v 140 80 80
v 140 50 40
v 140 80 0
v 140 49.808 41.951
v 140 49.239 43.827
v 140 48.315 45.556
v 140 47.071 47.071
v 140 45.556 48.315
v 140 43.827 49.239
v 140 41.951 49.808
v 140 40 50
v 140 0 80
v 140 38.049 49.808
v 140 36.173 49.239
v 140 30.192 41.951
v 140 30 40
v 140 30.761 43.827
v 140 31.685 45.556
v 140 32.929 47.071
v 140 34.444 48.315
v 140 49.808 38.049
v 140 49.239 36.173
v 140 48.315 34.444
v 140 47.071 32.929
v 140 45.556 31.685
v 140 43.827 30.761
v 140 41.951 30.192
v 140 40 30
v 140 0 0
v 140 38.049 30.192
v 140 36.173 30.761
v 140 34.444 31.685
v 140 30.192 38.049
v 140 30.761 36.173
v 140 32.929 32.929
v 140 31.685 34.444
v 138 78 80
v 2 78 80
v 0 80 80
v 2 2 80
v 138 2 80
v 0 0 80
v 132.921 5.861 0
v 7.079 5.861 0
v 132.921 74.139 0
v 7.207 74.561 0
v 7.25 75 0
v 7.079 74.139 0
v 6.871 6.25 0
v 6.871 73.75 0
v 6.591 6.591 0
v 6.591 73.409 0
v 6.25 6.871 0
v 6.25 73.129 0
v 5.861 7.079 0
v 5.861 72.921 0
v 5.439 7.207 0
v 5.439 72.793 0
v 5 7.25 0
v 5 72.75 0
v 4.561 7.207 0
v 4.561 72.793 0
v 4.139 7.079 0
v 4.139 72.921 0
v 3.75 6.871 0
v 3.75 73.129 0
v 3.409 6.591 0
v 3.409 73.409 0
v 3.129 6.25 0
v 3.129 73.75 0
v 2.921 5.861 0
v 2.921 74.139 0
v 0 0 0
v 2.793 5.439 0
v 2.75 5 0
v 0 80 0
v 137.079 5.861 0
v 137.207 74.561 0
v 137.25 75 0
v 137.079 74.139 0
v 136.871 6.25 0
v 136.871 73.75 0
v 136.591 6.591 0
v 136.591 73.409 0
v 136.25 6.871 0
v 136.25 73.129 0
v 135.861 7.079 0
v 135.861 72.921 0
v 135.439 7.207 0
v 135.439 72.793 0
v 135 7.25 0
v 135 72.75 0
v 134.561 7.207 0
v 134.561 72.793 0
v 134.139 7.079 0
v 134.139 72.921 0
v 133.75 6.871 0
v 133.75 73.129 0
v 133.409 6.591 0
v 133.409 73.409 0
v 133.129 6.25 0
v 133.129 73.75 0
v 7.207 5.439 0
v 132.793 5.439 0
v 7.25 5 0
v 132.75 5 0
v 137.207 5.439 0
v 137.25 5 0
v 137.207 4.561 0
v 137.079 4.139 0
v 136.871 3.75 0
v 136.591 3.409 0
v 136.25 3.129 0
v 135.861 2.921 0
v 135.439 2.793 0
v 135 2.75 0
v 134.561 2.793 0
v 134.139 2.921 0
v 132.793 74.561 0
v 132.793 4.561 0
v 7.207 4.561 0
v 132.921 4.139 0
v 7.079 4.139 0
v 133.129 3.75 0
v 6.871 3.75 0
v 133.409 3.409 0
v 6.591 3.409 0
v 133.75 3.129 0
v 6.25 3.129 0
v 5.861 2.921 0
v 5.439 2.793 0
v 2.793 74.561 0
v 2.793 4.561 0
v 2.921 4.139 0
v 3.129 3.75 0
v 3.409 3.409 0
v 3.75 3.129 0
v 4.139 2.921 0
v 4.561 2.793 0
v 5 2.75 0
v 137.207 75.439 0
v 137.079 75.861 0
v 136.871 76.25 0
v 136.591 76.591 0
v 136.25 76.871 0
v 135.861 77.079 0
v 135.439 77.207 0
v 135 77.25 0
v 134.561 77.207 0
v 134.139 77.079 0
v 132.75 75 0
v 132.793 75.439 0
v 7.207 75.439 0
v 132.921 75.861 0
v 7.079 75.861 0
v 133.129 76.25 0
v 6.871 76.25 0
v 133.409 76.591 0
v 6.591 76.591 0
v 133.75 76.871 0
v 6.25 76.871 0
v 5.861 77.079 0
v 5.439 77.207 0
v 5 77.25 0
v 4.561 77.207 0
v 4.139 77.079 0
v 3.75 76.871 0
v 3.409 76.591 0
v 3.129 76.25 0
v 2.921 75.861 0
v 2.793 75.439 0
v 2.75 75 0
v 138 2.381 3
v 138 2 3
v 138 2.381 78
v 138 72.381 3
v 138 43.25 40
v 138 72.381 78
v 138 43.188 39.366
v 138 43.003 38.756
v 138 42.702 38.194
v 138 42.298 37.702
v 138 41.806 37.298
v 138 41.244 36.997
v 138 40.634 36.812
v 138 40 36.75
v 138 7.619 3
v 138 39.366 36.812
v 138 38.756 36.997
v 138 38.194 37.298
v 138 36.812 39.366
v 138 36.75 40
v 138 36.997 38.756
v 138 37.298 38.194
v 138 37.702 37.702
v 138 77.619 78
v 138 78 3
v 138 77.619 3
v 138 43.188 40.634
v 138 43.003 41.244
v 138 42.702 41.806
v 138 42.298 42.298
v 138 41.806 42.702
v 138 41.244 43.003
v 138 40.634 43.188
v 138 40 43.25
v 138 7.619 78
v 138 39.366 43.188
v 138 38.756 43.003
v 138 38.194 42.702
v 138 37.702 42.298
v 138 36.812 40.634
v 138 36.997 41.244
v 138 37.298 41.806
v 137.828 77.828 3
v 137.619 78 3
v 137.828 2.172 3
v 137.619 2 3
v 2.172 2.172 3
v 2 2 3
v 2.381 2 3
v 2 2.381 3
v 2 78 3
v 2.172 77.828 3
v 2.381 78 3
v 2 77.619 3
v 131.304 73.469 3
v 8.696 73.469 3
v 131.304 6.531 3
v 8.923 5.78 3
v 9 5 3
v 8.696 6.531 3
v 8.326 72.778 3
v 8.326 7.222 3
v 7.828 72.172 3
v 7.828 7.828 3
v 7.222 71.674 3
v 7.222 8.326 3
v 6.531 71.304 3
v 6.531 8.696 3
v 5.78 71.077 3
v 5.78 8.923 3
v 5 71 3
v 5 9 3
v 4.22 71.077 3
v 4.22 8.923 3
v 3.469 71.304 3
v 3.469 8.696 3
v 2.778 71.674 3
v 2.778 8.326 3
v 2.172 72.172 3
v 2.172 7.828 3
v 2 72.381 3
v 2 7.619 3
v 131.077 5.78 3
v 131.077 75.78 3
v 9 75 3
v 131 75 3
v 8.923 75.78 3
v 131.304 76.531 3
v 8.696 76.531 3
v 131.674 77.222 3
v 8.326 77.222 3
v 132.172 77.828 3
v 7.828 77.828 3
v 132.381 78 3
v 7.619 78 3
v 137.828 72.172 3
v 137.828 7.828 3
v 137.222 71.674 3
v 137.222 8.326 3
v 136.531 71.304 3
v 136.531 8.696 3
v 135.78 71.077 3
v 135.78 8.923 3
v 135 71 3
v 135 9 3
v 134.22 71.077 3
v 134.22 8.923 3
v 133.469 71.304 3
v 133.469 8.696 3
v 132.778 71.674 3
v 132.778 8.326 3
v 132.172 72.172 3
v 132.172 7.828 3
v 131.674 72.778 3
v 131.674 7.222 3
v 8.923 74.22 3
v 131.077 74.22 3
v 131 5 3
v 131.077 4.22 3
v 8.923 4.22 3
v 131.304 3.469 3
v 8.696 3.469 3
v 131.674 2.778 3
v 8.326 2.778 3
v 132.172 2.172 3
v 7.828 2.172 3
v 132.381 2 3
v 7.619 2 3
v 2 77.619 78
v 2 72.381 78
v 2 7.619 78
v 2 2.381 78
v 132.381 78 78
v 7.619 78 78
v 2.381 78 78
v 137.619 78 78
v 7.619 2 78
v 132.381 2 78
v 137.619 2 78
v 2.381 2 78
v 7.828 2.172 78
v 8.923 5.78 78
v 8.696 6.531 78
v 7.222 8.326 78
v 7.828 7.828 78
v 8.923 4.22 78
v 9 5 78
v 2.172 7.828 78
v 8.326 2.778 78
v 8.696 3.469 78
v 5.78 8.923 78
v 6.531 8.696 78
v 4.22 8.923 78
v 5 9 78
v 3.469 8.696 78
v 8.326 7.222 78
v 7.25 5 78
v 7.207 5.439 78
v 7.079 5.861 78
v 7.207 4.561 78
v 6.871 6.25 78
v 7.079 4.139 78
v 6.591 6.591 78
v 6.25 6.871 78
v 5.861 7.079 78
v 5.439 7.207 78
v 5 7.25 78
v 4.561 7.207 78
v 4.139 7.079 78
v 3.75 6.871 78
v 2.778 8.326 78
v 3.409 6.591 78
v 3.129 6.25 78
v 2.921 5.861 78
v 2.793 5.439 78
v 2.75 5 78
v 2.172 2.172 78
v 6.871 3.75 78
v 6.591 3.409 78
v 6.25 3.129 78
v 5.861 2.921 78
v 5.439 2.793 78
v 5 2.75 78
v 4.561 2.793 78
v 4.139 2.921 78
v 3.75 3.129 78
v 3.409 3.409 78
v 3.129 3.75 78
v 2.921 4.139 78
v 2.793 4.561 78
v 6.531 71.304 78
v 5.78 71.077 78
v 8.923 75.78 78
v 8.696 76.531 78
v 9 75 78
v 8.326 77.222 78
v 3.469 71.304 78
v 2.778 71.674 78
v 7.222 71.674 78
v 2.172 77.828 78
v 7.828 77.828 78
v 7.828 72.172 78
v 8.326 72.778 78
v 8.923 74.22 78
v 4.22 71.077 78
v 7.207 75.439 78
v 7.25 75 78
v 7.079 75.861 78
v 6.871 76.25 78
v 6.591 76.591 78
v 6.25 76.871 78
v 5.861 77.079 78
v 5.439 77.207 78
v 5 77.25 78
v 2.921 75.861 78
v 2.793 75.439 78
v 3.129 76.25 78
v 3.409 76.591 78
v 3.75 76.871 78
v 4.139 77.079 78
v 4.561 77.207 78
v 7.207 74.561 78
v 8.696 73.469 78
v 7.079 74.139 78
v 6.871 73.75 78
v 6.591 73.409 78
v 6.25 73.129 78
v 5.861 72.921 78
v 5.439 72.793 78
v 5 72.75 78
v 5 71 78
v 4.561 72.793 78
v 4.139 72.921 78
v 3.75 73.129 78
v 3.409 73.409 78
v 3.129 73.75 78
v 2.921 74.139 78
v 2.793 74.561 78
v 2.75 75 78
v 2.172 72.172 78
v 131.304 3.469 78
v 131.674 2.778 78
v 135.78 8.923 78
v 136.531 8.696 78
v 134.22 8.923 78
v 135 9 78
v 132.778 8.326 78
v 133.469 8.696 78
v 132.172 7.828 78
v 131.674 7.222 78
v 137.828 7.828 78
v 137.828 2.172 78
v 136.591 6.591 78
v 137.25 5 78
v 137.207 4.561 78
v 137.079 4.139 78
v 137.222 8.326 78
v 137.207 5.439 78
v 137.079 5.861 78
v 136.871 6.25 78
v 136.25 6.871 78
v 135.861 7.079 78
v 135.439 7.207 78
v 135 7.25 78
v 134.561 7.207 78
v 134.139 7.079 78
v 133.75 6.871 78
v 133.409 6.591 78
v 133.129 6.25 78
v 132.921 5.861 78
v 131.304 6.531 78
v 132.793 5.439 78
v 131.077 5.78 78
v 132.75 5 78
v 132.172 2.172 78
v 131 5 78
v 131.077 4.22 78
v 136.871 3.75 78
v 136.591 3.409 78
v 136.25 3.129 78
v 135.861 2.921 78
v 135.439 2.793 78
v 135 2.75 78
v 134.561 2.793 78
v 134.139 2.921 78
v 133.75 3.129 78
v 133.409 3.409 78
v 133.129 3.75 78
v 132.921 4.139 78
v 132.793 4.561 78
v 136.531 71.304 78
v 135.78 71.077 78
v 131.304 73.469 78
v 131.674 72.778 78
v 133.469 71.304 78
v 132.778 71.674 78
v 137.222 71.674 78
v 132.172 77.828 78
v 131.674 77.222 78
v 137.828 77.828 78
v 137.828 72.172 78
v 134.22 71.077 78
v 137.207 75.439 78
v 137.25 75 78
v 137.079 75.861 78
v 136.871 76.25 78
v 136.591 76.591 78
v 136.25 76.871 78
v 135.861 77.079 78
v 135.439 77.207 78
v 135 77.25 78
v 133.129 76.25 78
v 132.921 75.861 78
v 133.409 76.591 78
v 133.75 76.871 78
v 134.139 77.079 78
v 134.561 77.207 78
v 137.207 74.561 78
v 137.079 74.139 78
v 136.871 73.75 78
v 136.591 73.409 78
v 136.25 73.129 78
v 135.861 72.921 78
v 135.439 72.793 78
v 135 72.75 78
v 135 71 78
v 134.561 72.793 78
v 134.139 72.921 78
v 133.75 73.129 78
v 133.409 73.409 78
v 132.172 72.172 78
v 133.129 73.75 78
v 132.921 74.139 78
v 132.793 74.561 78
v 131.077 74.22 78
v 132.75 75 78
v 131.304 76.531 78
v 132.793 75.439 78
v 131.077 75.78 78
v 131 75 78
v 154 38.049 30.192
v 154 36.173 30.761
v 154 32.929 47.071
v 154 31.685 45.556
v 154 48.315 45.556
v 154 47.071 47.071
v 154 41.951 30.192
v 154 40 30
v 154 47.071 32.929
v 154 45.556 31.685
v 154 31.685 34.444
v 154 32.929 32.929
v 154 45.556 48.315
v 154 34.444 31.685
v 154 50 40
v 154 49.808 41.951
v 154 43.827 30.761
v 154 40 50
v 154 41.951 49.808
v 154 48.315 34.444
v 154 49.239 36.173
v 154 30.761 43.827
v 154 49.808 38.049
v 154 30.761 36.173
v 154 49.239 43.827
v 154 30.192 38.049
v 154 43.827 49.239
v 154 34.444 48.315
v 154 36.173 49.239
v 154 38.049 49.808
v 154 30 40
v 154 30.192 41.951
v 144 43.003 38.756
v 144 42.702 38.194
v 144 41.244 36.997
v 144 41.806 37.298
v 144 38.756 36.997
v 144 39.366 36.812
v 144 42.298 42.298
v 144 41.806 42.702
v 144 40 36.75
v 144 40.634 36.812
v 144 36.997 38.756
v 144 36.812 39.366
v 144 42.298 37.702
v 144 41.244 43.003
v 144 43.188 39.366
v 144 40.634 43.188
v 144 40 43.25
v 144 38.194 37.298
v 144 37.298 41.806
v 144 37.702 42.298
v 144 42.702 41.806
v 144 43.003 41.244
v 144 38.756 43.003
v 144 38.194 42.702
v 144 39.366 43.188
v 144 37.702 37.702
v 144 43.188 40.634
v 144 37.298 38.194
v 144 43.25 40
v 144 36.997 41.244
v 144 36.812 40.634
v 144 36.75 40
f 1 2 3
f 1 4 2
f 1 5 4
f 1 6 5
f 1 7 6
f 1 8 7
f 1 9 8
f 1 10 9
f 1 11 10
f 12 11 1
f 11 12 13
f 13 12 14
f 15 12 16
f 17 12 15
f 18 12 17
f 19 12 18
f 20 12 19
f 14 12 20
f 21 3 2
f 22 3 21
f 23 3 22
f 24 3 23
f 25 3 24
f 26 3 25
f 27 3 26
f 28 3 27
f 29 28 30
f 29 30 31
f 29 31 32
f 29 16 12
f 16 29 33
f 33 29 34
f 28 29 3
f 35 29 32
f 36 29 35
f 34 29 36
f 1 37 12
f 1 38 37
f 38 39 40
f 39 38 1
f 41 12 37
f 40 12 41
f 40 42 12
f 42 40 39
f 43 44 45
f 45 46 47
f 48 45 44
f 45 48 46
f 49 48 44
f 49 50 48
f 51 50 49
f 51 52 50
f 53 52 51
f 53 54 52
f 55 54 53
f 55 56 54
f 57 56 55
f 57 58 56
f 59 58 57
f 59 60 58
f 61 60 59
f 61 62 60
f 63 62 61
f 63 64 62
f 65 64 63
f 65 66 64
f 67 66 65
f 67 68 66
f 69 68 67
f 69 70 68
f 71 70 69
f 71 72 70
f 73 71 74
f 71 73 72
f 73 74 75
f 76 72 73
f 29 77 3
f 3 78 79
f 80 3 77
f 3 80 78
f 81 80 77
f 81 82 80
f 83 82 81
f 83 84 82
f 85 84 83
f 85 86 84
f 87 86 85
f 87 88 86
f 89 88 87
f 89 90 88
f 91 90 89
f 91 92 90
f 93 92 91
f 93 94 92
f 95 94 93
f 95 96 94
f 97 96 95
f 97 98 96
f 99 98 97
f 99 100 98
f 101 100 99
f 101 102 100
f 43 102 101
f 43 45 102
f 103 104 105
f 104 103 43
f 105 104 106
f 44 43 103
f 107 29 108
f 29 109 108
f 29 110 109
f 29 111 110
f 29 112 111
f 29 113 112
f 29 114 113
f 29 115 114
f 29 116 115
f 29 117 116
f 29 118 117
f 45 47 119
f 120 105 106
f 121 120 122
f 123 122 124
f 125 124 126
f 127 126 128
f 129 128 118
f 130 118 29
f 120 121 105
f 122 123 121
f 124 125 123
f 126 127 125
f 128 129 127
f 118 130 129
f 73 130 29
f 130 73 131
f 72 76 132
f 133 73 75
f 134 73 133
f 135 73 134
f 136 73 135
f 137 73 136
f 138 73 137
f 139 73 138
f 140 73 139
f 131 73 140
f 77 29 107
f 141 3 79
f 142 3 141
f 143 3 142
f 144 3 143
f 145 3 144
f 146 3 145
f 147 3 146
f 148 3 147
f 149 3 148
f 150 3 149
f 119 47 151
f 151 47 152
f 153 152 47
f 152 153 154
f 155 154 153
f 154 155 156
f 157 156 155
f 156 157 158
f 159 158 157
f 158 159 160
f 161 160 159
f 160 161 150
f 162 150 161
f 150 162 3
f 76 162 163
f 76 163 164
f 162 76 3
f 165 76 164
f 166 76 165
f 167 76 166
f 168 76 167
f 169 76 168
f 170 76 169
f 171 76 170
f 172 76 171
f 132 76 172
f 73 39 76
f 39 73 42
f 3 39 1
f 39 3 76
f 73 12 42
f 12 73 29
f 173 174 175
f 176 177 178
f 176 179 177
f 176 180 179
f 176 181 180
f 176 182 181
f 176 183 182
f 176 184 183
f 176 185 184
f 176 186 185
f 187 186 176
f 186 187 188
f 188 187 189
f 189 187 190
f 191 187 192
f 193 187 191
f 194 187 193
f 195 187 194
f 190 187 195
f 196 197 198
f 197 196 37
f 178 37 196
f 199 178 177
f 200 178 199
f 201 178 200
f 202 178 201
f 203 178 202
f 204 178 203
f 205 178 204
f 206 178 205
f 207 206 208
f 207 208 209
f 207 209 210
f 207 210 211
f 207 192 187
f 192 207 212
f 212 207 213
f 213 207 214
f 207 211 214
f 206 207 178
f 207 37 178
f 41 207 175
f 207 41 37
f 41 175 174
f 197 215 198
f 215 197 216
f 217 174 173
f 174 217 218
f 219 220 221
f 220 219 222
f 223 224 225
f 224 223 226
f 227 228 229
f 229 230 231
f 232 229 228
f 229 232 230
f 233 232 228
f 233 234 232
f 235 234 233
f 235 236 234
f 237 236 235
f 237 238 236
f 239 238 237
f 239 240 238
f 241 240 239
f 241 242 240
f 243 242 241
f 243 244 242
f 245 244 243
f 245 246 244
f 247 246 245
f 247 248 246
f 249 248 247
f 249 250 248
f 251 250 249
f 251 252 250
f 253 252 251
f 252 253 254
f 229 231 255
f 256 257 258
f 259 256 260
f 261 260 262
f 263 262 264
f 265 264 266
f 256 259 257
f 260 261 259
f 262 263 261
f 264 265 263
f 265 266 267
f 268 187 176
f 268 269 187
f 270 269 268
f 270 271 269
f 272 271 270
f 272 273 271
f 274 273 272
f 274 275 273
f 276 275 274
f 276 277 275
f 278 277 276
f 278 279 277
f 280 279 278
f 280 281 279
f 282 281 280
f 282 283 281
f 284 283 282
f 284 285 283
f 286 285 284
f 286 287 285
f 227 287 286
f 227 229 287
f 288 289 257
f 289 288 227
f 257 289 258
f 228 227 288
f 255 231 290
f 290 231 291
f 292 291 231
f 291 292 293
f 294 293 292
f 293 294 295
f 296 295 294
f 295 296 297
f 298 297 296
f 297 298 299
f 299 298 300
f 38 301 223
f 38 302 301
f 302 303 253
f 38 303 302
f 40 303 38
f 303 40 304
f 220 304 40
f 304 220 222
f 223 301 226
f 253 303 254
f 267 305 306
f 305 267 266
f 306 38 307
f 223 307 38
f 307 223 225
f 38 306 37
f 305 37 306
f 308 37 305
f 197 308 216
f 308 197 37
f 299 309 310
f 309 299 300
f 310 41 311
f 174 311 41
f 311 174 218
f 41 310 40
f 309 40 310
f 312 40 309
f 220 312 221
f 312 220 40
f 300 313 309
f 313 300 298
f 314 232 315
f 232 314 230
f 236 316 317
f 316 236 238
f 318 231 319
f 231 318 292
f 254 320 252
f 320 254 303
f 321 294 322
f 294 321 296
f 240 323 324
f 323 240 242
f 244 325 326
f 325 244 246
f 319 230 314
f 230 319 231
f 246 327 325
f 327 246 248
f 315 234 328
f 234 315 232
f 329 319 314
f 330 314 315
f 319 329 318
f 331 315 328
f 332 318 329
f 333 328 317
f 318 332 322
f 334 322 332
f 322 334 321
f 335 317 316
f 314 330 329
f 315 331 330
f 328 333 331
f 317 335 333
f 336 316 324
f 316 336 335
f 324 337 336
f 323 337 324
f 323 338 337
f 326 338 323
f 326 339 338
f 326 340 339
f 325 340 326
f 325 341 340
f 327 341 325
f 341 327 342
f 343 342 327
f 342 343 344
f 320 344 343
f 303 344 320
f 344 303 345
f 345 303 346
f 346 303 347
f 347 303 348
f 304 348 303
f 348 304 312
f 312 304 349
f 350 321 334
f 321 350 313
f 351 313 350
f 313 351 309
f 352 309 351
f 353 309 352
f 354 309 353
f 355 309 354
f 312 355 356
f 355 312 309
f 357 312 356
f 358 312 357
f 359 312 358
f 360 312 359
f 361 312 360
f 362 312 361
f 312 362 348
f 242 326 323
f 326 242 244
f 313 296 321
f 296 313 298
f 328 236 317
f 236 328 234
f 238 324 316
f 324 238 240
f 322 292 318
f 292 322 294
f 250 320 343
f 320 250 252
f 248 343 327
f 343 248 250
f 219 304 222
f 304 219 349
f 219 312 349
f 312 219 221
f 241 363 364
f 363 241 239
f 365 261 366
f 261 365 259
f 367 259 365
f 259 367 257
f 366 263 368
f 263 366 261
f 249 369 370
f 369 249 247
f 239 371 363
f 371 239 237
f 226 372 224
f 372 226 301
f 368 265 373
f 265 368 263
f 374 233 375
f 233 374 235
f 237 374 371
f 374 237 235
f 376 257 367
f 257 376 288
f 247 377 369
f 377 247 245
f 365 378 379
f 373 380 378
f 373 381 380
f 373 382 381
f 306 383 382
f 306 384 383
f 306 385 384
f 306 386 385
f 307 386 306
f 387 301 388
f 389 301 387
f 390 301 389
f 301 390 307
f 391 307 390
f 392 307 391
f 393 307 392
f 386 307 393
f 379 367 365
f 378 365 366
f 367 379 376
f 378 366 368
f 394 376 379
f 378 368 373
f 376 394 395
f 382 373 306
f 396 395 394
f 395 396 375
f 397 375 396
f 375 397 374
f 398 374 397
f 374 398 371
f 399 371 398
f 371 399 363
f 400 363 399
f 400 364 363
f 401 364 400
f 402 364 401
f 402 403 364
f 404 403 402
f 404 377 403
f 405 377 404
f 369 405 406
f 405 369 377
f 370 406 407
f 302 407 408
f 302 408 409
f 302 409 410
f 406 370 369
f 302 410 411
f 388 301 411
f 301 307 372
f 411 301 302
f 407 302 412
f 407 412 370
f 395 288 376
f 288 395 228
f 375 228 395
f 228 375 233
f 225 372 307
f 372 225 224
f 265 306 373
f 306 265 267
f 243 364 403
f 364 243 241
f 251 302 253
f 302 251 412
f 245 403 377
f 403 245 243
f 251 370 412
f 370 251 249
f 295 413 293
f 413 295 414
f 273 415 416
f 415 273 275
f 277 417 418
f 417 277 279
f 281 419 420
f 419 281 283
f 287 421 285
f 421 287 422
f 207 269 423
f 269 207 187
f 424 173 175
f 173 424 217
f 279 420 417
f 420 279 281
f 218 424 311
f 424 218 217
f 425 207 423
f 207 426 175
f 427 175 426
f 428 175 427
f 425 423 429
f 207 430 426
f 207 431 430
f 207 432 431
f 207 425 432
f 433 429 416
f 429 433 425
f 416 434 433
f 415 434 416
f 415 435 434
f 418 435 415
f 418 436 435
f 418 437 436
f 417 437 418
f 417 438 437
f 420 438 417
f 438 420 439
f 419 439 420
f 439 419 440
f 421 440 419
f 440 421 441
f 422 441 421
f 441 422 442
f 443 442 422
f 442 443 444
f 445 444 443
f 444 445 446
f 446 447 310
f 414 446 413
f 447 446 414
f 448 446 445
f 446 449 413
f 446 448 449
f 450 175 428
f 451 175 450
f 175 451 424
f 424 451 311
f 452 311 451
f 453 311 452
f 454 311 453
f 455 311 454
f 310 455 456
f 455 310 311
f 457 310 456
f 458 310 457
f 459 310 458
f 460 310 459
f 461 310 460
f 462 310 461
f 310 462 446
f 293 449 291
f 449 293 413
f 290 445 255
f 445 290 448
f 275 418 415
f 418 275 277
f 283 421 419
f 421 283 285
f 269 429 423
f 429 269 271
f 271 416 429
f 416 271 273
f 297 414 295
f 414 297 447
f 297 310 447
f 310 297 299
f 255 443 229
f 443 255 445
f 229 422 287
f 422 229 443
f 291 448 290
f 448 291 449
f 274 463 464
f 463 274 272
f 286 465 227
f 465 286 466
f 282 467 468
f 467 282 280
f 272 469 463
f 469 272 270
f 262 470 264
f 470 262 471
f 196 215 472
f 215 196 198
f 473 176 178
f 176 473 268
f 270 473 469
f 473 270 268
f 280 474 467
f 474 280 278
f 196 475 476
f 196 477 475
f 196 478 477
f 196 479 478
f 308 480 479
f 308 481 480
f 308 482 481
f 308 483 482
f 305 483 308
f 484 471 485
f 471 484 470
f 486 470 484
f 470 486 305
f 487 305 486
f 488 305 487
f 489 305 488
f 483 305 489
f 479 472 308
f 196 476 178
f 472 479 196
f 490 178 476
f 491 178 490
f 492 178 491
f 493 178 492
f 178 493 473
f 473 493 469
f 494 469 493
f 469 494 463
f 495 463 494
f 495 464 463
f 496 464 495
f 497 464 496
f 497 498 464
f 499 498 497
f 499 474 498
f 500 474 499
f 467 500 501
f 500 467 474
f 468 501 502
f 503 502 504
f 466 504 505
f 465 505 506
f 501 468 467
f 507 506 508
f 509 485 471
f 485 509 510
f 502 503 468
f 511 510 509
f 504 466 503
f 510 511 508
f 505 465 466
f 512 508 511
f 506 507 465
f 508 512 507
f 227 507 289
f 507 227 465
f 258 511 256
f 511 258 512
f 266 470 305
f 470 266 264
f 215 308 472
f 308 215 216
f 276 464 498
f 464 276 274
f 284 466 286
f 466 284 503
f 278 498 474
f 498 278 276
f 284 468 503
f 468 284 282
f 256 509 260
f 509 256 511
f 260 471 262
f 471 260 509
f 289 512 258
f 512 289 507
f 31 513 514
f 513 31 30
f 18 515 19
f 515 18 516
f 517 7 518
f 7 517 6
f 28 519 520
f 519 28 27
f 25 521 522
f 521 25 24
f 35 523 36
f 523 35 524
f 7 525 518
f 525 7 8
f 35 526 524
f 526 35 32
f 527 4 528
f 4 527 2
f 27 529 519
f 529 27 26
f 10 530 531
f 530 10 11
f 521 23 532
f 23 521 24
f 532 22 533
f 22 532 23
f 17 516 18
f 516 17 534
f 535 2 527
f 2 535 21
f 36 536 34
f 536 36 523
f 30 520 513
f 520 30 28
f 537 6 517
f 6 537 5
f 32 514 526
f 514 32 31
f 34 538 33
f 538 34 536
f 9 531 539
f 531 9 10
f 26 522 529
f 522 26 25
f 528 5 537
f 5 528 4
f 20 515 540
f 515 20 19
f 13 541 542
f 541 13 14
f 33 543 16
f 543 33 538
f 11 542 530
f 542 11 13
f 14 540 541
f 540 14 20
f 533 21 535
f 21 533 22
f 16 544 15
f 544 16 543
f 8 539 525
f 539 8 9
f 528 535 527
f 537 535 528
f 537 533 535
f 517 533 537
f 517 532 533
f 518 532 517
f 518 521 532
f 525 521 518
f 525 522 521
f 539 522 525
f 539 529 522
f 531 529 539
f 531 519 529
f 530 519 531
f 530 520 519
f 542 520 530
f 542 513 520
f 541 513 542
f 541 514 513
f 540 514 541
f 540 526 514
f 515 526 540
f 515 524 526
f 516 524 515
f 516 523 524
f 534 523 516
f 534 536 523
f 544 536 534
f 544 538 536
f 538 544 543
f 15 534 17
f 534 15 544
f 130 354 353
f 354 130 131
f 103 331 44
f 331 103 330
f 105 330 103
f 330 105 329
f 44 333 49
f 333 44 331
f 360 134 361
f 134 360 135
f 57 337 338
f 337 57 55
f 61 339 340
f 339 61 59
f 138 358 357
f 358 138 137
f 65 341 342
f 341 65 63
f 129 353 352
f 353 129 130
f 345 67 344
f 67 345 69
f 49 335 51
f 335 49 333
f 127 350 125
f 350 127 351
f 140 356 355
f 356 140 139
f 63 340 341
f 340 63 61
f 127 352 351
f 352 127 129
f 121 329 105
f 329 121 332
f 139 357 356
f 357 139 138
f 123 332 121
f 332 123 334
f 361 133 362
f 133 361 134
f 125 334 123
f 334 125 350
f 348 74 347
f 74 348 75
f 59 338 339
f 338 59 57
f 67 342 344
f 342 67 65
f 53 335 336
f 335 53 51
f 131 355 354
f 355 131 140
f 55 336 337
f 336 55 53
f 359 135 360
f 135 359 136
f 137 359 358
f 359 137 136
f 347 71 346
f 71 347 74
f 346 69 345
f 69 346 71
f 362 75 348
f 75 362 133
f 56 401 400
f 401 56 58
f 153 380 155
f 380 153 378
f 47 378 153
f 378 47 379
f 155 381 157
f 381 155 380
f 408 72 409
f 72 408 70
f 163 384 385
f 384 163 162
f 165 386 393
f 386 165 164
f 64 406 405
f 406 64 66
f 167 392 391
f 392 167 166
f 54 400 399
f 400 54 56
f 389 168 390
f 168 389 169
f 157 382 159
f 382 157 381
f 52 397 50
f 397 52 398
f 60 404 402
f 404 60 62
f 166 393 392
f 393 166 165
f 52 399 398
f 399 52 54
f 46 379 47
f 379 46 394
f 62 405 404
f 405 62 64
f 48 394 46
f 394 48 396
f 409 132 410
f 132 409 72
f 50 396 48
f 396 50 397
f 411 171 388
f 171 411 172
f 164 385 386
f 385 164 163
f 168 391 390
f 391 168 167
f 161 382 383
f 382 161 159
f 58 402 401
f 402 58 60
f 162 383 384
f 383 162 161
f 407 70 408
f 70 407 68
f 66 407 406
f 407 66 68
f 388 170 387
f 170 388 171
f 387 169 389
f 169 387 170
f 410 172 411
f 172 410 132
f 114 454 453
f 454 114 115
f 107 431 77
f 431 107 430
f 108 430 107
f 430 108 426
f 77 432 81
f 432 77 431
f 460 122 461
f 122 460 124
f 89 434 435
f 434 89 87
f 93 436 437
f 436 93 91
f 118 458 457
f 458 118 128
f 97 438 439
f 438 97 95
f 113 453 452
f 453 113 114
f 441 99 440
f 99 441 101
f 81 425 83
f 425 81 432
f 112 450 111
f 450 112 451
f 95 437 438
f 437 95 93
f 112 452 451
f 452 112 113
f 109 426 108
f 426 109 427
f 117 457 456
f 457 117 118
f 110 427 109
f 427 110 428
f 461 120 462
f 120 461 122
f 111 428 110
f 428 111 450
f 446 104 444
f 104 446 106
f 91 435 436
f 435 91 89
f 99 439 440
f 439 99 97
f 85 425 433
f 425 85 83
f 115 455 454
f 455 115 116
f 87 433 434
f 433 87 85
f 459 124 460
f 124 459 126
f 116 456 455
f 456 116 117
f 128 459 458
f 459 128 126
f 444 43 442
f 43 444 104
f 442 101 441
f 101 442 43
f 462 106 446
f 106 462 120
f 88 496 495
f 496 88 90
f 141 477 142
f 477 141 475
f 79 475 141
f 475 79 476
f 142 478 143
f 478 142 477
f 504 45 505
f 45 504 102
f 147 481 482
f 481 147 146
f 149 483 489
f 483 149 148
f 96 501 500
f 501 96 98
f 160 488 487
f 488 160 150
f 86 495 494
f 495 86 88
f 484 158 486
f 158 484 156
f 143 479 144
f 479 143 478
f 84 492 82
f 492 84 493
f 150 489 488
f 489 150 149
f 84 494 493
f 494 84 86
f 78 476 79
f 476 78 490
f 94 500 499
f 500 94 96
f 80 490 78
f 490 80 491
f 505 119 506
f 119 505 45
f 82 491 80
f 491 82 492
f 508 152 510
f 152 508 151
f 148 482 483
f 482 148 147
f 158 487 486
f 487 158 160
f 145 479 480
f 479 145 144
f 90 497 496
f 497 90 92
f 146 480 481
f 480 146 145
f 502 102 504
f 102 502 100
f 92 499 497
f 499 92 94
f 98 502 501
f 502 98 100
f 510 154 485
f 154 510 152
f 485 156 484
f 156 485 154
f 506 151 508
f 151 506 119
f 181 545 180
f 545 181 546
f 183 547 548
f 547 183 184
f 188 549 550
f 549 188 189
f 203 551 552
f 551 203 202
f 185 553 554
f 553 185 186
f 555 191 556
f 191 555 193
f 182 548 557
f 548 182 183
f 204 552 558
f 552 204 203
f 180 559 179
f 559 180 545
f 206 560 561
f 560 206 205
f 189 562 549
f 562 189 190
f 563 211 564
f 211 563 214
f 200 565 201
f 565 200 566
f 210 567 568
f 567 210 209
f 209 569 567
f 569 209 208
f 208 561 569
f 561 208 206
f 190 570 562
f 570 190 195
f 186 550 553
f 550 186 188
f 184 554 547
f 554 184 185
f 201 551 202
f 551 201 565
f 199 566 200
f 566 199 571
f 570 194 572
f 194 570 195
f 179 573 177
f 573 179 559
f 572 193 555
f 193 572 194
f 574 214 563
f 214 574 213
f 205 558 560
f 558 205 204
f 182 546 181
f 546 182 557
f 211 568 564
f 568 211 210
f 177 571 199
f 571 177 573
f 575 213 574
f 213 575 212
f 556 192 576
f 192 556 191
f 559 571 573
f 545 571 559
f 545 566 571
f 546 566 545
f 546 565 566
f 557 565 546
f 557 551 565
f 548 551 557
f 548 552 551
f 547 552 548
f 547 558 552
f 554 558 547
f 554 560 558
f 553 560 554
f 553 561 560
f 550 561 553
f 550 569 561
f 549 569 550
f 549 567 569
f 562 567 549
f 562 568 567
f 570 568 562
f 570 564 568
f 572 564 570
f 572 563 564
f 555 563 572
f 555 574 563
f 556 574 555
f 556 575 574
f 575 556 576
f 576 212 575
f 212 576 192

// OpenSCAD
$fn = 32;

// ----------------------------------------------------------------------
// Enclosure body: 140 x 80 x 80 mm, wall 2 mm
// ----------------------------------------------------------------------

// --- parameters (mm) ---
length = 140;             // outside length, X
width = 80;               // outside width, Y
height = 80;              // outside height, Z
wall = 2;                 // side wall thickness
floor_t = 3;              // floor thickness
boss_d = 8;               // corner boss diameter
boss_h = 75;              // corner boss height above the floor
boss_hole_d = 4.5;        // lid screw clearance in the boss
boss_lip = 5;             // boss centre inset from the corner
nipple_d = 20;            // cable gland boss diameter
nipple_h = 14;            // cable gland boss height
nipple_bore = 6.5;        // cable gland bore

module shell() {
  difference() {
    cube([length, width, height]);
    /* hollow, open at the top */
    translate([wall, wall, floor_t])
      cube([length - 2 * wall, width - 2 * wall, height]);
  }
}

module bosses() {
  /* corner bosses, sunk 1 mm into the floor */
  for (sx = [0, 1]) for (sy = [0, 1])
    translate([sx * (length - 2 * boss_lip) + boss_lip, sy * (width - 2 * boss_lip) + boss_lip, floor_t - 1])
      cylinder(h = boss_h + 1, d = boss_d);
}

module gland() {
  /* boss on the short wall, sunk 1 mm into it */
  translate([length - 1, width / 2, height * 0.5]) rotate([0, 90, 0])
    cylinder(h = nipple_h + 1, d = nipple_d);
}

difference() {
  union() {
    shell();
    bosses();
    gland();
  }
  /* boss screw holes */
  for (sx = [0, 1]) for (sy = [0, 1])
    translate([sx * (length - 2 * boss_lip) + boss_lip, sy * (width - 2 * boss_lip) + boss_lip, -1]) cylinder(h = floor_t + boss_h + 2, d = boss_hole_d);
  translate([length, width / 2, height * 0.5]) rotate([0, 90, 0]) translate([0, 0, -nipple_h - 2]) cylinder(h = nipple_h + wall + 4, d = nipple_bore);
}
